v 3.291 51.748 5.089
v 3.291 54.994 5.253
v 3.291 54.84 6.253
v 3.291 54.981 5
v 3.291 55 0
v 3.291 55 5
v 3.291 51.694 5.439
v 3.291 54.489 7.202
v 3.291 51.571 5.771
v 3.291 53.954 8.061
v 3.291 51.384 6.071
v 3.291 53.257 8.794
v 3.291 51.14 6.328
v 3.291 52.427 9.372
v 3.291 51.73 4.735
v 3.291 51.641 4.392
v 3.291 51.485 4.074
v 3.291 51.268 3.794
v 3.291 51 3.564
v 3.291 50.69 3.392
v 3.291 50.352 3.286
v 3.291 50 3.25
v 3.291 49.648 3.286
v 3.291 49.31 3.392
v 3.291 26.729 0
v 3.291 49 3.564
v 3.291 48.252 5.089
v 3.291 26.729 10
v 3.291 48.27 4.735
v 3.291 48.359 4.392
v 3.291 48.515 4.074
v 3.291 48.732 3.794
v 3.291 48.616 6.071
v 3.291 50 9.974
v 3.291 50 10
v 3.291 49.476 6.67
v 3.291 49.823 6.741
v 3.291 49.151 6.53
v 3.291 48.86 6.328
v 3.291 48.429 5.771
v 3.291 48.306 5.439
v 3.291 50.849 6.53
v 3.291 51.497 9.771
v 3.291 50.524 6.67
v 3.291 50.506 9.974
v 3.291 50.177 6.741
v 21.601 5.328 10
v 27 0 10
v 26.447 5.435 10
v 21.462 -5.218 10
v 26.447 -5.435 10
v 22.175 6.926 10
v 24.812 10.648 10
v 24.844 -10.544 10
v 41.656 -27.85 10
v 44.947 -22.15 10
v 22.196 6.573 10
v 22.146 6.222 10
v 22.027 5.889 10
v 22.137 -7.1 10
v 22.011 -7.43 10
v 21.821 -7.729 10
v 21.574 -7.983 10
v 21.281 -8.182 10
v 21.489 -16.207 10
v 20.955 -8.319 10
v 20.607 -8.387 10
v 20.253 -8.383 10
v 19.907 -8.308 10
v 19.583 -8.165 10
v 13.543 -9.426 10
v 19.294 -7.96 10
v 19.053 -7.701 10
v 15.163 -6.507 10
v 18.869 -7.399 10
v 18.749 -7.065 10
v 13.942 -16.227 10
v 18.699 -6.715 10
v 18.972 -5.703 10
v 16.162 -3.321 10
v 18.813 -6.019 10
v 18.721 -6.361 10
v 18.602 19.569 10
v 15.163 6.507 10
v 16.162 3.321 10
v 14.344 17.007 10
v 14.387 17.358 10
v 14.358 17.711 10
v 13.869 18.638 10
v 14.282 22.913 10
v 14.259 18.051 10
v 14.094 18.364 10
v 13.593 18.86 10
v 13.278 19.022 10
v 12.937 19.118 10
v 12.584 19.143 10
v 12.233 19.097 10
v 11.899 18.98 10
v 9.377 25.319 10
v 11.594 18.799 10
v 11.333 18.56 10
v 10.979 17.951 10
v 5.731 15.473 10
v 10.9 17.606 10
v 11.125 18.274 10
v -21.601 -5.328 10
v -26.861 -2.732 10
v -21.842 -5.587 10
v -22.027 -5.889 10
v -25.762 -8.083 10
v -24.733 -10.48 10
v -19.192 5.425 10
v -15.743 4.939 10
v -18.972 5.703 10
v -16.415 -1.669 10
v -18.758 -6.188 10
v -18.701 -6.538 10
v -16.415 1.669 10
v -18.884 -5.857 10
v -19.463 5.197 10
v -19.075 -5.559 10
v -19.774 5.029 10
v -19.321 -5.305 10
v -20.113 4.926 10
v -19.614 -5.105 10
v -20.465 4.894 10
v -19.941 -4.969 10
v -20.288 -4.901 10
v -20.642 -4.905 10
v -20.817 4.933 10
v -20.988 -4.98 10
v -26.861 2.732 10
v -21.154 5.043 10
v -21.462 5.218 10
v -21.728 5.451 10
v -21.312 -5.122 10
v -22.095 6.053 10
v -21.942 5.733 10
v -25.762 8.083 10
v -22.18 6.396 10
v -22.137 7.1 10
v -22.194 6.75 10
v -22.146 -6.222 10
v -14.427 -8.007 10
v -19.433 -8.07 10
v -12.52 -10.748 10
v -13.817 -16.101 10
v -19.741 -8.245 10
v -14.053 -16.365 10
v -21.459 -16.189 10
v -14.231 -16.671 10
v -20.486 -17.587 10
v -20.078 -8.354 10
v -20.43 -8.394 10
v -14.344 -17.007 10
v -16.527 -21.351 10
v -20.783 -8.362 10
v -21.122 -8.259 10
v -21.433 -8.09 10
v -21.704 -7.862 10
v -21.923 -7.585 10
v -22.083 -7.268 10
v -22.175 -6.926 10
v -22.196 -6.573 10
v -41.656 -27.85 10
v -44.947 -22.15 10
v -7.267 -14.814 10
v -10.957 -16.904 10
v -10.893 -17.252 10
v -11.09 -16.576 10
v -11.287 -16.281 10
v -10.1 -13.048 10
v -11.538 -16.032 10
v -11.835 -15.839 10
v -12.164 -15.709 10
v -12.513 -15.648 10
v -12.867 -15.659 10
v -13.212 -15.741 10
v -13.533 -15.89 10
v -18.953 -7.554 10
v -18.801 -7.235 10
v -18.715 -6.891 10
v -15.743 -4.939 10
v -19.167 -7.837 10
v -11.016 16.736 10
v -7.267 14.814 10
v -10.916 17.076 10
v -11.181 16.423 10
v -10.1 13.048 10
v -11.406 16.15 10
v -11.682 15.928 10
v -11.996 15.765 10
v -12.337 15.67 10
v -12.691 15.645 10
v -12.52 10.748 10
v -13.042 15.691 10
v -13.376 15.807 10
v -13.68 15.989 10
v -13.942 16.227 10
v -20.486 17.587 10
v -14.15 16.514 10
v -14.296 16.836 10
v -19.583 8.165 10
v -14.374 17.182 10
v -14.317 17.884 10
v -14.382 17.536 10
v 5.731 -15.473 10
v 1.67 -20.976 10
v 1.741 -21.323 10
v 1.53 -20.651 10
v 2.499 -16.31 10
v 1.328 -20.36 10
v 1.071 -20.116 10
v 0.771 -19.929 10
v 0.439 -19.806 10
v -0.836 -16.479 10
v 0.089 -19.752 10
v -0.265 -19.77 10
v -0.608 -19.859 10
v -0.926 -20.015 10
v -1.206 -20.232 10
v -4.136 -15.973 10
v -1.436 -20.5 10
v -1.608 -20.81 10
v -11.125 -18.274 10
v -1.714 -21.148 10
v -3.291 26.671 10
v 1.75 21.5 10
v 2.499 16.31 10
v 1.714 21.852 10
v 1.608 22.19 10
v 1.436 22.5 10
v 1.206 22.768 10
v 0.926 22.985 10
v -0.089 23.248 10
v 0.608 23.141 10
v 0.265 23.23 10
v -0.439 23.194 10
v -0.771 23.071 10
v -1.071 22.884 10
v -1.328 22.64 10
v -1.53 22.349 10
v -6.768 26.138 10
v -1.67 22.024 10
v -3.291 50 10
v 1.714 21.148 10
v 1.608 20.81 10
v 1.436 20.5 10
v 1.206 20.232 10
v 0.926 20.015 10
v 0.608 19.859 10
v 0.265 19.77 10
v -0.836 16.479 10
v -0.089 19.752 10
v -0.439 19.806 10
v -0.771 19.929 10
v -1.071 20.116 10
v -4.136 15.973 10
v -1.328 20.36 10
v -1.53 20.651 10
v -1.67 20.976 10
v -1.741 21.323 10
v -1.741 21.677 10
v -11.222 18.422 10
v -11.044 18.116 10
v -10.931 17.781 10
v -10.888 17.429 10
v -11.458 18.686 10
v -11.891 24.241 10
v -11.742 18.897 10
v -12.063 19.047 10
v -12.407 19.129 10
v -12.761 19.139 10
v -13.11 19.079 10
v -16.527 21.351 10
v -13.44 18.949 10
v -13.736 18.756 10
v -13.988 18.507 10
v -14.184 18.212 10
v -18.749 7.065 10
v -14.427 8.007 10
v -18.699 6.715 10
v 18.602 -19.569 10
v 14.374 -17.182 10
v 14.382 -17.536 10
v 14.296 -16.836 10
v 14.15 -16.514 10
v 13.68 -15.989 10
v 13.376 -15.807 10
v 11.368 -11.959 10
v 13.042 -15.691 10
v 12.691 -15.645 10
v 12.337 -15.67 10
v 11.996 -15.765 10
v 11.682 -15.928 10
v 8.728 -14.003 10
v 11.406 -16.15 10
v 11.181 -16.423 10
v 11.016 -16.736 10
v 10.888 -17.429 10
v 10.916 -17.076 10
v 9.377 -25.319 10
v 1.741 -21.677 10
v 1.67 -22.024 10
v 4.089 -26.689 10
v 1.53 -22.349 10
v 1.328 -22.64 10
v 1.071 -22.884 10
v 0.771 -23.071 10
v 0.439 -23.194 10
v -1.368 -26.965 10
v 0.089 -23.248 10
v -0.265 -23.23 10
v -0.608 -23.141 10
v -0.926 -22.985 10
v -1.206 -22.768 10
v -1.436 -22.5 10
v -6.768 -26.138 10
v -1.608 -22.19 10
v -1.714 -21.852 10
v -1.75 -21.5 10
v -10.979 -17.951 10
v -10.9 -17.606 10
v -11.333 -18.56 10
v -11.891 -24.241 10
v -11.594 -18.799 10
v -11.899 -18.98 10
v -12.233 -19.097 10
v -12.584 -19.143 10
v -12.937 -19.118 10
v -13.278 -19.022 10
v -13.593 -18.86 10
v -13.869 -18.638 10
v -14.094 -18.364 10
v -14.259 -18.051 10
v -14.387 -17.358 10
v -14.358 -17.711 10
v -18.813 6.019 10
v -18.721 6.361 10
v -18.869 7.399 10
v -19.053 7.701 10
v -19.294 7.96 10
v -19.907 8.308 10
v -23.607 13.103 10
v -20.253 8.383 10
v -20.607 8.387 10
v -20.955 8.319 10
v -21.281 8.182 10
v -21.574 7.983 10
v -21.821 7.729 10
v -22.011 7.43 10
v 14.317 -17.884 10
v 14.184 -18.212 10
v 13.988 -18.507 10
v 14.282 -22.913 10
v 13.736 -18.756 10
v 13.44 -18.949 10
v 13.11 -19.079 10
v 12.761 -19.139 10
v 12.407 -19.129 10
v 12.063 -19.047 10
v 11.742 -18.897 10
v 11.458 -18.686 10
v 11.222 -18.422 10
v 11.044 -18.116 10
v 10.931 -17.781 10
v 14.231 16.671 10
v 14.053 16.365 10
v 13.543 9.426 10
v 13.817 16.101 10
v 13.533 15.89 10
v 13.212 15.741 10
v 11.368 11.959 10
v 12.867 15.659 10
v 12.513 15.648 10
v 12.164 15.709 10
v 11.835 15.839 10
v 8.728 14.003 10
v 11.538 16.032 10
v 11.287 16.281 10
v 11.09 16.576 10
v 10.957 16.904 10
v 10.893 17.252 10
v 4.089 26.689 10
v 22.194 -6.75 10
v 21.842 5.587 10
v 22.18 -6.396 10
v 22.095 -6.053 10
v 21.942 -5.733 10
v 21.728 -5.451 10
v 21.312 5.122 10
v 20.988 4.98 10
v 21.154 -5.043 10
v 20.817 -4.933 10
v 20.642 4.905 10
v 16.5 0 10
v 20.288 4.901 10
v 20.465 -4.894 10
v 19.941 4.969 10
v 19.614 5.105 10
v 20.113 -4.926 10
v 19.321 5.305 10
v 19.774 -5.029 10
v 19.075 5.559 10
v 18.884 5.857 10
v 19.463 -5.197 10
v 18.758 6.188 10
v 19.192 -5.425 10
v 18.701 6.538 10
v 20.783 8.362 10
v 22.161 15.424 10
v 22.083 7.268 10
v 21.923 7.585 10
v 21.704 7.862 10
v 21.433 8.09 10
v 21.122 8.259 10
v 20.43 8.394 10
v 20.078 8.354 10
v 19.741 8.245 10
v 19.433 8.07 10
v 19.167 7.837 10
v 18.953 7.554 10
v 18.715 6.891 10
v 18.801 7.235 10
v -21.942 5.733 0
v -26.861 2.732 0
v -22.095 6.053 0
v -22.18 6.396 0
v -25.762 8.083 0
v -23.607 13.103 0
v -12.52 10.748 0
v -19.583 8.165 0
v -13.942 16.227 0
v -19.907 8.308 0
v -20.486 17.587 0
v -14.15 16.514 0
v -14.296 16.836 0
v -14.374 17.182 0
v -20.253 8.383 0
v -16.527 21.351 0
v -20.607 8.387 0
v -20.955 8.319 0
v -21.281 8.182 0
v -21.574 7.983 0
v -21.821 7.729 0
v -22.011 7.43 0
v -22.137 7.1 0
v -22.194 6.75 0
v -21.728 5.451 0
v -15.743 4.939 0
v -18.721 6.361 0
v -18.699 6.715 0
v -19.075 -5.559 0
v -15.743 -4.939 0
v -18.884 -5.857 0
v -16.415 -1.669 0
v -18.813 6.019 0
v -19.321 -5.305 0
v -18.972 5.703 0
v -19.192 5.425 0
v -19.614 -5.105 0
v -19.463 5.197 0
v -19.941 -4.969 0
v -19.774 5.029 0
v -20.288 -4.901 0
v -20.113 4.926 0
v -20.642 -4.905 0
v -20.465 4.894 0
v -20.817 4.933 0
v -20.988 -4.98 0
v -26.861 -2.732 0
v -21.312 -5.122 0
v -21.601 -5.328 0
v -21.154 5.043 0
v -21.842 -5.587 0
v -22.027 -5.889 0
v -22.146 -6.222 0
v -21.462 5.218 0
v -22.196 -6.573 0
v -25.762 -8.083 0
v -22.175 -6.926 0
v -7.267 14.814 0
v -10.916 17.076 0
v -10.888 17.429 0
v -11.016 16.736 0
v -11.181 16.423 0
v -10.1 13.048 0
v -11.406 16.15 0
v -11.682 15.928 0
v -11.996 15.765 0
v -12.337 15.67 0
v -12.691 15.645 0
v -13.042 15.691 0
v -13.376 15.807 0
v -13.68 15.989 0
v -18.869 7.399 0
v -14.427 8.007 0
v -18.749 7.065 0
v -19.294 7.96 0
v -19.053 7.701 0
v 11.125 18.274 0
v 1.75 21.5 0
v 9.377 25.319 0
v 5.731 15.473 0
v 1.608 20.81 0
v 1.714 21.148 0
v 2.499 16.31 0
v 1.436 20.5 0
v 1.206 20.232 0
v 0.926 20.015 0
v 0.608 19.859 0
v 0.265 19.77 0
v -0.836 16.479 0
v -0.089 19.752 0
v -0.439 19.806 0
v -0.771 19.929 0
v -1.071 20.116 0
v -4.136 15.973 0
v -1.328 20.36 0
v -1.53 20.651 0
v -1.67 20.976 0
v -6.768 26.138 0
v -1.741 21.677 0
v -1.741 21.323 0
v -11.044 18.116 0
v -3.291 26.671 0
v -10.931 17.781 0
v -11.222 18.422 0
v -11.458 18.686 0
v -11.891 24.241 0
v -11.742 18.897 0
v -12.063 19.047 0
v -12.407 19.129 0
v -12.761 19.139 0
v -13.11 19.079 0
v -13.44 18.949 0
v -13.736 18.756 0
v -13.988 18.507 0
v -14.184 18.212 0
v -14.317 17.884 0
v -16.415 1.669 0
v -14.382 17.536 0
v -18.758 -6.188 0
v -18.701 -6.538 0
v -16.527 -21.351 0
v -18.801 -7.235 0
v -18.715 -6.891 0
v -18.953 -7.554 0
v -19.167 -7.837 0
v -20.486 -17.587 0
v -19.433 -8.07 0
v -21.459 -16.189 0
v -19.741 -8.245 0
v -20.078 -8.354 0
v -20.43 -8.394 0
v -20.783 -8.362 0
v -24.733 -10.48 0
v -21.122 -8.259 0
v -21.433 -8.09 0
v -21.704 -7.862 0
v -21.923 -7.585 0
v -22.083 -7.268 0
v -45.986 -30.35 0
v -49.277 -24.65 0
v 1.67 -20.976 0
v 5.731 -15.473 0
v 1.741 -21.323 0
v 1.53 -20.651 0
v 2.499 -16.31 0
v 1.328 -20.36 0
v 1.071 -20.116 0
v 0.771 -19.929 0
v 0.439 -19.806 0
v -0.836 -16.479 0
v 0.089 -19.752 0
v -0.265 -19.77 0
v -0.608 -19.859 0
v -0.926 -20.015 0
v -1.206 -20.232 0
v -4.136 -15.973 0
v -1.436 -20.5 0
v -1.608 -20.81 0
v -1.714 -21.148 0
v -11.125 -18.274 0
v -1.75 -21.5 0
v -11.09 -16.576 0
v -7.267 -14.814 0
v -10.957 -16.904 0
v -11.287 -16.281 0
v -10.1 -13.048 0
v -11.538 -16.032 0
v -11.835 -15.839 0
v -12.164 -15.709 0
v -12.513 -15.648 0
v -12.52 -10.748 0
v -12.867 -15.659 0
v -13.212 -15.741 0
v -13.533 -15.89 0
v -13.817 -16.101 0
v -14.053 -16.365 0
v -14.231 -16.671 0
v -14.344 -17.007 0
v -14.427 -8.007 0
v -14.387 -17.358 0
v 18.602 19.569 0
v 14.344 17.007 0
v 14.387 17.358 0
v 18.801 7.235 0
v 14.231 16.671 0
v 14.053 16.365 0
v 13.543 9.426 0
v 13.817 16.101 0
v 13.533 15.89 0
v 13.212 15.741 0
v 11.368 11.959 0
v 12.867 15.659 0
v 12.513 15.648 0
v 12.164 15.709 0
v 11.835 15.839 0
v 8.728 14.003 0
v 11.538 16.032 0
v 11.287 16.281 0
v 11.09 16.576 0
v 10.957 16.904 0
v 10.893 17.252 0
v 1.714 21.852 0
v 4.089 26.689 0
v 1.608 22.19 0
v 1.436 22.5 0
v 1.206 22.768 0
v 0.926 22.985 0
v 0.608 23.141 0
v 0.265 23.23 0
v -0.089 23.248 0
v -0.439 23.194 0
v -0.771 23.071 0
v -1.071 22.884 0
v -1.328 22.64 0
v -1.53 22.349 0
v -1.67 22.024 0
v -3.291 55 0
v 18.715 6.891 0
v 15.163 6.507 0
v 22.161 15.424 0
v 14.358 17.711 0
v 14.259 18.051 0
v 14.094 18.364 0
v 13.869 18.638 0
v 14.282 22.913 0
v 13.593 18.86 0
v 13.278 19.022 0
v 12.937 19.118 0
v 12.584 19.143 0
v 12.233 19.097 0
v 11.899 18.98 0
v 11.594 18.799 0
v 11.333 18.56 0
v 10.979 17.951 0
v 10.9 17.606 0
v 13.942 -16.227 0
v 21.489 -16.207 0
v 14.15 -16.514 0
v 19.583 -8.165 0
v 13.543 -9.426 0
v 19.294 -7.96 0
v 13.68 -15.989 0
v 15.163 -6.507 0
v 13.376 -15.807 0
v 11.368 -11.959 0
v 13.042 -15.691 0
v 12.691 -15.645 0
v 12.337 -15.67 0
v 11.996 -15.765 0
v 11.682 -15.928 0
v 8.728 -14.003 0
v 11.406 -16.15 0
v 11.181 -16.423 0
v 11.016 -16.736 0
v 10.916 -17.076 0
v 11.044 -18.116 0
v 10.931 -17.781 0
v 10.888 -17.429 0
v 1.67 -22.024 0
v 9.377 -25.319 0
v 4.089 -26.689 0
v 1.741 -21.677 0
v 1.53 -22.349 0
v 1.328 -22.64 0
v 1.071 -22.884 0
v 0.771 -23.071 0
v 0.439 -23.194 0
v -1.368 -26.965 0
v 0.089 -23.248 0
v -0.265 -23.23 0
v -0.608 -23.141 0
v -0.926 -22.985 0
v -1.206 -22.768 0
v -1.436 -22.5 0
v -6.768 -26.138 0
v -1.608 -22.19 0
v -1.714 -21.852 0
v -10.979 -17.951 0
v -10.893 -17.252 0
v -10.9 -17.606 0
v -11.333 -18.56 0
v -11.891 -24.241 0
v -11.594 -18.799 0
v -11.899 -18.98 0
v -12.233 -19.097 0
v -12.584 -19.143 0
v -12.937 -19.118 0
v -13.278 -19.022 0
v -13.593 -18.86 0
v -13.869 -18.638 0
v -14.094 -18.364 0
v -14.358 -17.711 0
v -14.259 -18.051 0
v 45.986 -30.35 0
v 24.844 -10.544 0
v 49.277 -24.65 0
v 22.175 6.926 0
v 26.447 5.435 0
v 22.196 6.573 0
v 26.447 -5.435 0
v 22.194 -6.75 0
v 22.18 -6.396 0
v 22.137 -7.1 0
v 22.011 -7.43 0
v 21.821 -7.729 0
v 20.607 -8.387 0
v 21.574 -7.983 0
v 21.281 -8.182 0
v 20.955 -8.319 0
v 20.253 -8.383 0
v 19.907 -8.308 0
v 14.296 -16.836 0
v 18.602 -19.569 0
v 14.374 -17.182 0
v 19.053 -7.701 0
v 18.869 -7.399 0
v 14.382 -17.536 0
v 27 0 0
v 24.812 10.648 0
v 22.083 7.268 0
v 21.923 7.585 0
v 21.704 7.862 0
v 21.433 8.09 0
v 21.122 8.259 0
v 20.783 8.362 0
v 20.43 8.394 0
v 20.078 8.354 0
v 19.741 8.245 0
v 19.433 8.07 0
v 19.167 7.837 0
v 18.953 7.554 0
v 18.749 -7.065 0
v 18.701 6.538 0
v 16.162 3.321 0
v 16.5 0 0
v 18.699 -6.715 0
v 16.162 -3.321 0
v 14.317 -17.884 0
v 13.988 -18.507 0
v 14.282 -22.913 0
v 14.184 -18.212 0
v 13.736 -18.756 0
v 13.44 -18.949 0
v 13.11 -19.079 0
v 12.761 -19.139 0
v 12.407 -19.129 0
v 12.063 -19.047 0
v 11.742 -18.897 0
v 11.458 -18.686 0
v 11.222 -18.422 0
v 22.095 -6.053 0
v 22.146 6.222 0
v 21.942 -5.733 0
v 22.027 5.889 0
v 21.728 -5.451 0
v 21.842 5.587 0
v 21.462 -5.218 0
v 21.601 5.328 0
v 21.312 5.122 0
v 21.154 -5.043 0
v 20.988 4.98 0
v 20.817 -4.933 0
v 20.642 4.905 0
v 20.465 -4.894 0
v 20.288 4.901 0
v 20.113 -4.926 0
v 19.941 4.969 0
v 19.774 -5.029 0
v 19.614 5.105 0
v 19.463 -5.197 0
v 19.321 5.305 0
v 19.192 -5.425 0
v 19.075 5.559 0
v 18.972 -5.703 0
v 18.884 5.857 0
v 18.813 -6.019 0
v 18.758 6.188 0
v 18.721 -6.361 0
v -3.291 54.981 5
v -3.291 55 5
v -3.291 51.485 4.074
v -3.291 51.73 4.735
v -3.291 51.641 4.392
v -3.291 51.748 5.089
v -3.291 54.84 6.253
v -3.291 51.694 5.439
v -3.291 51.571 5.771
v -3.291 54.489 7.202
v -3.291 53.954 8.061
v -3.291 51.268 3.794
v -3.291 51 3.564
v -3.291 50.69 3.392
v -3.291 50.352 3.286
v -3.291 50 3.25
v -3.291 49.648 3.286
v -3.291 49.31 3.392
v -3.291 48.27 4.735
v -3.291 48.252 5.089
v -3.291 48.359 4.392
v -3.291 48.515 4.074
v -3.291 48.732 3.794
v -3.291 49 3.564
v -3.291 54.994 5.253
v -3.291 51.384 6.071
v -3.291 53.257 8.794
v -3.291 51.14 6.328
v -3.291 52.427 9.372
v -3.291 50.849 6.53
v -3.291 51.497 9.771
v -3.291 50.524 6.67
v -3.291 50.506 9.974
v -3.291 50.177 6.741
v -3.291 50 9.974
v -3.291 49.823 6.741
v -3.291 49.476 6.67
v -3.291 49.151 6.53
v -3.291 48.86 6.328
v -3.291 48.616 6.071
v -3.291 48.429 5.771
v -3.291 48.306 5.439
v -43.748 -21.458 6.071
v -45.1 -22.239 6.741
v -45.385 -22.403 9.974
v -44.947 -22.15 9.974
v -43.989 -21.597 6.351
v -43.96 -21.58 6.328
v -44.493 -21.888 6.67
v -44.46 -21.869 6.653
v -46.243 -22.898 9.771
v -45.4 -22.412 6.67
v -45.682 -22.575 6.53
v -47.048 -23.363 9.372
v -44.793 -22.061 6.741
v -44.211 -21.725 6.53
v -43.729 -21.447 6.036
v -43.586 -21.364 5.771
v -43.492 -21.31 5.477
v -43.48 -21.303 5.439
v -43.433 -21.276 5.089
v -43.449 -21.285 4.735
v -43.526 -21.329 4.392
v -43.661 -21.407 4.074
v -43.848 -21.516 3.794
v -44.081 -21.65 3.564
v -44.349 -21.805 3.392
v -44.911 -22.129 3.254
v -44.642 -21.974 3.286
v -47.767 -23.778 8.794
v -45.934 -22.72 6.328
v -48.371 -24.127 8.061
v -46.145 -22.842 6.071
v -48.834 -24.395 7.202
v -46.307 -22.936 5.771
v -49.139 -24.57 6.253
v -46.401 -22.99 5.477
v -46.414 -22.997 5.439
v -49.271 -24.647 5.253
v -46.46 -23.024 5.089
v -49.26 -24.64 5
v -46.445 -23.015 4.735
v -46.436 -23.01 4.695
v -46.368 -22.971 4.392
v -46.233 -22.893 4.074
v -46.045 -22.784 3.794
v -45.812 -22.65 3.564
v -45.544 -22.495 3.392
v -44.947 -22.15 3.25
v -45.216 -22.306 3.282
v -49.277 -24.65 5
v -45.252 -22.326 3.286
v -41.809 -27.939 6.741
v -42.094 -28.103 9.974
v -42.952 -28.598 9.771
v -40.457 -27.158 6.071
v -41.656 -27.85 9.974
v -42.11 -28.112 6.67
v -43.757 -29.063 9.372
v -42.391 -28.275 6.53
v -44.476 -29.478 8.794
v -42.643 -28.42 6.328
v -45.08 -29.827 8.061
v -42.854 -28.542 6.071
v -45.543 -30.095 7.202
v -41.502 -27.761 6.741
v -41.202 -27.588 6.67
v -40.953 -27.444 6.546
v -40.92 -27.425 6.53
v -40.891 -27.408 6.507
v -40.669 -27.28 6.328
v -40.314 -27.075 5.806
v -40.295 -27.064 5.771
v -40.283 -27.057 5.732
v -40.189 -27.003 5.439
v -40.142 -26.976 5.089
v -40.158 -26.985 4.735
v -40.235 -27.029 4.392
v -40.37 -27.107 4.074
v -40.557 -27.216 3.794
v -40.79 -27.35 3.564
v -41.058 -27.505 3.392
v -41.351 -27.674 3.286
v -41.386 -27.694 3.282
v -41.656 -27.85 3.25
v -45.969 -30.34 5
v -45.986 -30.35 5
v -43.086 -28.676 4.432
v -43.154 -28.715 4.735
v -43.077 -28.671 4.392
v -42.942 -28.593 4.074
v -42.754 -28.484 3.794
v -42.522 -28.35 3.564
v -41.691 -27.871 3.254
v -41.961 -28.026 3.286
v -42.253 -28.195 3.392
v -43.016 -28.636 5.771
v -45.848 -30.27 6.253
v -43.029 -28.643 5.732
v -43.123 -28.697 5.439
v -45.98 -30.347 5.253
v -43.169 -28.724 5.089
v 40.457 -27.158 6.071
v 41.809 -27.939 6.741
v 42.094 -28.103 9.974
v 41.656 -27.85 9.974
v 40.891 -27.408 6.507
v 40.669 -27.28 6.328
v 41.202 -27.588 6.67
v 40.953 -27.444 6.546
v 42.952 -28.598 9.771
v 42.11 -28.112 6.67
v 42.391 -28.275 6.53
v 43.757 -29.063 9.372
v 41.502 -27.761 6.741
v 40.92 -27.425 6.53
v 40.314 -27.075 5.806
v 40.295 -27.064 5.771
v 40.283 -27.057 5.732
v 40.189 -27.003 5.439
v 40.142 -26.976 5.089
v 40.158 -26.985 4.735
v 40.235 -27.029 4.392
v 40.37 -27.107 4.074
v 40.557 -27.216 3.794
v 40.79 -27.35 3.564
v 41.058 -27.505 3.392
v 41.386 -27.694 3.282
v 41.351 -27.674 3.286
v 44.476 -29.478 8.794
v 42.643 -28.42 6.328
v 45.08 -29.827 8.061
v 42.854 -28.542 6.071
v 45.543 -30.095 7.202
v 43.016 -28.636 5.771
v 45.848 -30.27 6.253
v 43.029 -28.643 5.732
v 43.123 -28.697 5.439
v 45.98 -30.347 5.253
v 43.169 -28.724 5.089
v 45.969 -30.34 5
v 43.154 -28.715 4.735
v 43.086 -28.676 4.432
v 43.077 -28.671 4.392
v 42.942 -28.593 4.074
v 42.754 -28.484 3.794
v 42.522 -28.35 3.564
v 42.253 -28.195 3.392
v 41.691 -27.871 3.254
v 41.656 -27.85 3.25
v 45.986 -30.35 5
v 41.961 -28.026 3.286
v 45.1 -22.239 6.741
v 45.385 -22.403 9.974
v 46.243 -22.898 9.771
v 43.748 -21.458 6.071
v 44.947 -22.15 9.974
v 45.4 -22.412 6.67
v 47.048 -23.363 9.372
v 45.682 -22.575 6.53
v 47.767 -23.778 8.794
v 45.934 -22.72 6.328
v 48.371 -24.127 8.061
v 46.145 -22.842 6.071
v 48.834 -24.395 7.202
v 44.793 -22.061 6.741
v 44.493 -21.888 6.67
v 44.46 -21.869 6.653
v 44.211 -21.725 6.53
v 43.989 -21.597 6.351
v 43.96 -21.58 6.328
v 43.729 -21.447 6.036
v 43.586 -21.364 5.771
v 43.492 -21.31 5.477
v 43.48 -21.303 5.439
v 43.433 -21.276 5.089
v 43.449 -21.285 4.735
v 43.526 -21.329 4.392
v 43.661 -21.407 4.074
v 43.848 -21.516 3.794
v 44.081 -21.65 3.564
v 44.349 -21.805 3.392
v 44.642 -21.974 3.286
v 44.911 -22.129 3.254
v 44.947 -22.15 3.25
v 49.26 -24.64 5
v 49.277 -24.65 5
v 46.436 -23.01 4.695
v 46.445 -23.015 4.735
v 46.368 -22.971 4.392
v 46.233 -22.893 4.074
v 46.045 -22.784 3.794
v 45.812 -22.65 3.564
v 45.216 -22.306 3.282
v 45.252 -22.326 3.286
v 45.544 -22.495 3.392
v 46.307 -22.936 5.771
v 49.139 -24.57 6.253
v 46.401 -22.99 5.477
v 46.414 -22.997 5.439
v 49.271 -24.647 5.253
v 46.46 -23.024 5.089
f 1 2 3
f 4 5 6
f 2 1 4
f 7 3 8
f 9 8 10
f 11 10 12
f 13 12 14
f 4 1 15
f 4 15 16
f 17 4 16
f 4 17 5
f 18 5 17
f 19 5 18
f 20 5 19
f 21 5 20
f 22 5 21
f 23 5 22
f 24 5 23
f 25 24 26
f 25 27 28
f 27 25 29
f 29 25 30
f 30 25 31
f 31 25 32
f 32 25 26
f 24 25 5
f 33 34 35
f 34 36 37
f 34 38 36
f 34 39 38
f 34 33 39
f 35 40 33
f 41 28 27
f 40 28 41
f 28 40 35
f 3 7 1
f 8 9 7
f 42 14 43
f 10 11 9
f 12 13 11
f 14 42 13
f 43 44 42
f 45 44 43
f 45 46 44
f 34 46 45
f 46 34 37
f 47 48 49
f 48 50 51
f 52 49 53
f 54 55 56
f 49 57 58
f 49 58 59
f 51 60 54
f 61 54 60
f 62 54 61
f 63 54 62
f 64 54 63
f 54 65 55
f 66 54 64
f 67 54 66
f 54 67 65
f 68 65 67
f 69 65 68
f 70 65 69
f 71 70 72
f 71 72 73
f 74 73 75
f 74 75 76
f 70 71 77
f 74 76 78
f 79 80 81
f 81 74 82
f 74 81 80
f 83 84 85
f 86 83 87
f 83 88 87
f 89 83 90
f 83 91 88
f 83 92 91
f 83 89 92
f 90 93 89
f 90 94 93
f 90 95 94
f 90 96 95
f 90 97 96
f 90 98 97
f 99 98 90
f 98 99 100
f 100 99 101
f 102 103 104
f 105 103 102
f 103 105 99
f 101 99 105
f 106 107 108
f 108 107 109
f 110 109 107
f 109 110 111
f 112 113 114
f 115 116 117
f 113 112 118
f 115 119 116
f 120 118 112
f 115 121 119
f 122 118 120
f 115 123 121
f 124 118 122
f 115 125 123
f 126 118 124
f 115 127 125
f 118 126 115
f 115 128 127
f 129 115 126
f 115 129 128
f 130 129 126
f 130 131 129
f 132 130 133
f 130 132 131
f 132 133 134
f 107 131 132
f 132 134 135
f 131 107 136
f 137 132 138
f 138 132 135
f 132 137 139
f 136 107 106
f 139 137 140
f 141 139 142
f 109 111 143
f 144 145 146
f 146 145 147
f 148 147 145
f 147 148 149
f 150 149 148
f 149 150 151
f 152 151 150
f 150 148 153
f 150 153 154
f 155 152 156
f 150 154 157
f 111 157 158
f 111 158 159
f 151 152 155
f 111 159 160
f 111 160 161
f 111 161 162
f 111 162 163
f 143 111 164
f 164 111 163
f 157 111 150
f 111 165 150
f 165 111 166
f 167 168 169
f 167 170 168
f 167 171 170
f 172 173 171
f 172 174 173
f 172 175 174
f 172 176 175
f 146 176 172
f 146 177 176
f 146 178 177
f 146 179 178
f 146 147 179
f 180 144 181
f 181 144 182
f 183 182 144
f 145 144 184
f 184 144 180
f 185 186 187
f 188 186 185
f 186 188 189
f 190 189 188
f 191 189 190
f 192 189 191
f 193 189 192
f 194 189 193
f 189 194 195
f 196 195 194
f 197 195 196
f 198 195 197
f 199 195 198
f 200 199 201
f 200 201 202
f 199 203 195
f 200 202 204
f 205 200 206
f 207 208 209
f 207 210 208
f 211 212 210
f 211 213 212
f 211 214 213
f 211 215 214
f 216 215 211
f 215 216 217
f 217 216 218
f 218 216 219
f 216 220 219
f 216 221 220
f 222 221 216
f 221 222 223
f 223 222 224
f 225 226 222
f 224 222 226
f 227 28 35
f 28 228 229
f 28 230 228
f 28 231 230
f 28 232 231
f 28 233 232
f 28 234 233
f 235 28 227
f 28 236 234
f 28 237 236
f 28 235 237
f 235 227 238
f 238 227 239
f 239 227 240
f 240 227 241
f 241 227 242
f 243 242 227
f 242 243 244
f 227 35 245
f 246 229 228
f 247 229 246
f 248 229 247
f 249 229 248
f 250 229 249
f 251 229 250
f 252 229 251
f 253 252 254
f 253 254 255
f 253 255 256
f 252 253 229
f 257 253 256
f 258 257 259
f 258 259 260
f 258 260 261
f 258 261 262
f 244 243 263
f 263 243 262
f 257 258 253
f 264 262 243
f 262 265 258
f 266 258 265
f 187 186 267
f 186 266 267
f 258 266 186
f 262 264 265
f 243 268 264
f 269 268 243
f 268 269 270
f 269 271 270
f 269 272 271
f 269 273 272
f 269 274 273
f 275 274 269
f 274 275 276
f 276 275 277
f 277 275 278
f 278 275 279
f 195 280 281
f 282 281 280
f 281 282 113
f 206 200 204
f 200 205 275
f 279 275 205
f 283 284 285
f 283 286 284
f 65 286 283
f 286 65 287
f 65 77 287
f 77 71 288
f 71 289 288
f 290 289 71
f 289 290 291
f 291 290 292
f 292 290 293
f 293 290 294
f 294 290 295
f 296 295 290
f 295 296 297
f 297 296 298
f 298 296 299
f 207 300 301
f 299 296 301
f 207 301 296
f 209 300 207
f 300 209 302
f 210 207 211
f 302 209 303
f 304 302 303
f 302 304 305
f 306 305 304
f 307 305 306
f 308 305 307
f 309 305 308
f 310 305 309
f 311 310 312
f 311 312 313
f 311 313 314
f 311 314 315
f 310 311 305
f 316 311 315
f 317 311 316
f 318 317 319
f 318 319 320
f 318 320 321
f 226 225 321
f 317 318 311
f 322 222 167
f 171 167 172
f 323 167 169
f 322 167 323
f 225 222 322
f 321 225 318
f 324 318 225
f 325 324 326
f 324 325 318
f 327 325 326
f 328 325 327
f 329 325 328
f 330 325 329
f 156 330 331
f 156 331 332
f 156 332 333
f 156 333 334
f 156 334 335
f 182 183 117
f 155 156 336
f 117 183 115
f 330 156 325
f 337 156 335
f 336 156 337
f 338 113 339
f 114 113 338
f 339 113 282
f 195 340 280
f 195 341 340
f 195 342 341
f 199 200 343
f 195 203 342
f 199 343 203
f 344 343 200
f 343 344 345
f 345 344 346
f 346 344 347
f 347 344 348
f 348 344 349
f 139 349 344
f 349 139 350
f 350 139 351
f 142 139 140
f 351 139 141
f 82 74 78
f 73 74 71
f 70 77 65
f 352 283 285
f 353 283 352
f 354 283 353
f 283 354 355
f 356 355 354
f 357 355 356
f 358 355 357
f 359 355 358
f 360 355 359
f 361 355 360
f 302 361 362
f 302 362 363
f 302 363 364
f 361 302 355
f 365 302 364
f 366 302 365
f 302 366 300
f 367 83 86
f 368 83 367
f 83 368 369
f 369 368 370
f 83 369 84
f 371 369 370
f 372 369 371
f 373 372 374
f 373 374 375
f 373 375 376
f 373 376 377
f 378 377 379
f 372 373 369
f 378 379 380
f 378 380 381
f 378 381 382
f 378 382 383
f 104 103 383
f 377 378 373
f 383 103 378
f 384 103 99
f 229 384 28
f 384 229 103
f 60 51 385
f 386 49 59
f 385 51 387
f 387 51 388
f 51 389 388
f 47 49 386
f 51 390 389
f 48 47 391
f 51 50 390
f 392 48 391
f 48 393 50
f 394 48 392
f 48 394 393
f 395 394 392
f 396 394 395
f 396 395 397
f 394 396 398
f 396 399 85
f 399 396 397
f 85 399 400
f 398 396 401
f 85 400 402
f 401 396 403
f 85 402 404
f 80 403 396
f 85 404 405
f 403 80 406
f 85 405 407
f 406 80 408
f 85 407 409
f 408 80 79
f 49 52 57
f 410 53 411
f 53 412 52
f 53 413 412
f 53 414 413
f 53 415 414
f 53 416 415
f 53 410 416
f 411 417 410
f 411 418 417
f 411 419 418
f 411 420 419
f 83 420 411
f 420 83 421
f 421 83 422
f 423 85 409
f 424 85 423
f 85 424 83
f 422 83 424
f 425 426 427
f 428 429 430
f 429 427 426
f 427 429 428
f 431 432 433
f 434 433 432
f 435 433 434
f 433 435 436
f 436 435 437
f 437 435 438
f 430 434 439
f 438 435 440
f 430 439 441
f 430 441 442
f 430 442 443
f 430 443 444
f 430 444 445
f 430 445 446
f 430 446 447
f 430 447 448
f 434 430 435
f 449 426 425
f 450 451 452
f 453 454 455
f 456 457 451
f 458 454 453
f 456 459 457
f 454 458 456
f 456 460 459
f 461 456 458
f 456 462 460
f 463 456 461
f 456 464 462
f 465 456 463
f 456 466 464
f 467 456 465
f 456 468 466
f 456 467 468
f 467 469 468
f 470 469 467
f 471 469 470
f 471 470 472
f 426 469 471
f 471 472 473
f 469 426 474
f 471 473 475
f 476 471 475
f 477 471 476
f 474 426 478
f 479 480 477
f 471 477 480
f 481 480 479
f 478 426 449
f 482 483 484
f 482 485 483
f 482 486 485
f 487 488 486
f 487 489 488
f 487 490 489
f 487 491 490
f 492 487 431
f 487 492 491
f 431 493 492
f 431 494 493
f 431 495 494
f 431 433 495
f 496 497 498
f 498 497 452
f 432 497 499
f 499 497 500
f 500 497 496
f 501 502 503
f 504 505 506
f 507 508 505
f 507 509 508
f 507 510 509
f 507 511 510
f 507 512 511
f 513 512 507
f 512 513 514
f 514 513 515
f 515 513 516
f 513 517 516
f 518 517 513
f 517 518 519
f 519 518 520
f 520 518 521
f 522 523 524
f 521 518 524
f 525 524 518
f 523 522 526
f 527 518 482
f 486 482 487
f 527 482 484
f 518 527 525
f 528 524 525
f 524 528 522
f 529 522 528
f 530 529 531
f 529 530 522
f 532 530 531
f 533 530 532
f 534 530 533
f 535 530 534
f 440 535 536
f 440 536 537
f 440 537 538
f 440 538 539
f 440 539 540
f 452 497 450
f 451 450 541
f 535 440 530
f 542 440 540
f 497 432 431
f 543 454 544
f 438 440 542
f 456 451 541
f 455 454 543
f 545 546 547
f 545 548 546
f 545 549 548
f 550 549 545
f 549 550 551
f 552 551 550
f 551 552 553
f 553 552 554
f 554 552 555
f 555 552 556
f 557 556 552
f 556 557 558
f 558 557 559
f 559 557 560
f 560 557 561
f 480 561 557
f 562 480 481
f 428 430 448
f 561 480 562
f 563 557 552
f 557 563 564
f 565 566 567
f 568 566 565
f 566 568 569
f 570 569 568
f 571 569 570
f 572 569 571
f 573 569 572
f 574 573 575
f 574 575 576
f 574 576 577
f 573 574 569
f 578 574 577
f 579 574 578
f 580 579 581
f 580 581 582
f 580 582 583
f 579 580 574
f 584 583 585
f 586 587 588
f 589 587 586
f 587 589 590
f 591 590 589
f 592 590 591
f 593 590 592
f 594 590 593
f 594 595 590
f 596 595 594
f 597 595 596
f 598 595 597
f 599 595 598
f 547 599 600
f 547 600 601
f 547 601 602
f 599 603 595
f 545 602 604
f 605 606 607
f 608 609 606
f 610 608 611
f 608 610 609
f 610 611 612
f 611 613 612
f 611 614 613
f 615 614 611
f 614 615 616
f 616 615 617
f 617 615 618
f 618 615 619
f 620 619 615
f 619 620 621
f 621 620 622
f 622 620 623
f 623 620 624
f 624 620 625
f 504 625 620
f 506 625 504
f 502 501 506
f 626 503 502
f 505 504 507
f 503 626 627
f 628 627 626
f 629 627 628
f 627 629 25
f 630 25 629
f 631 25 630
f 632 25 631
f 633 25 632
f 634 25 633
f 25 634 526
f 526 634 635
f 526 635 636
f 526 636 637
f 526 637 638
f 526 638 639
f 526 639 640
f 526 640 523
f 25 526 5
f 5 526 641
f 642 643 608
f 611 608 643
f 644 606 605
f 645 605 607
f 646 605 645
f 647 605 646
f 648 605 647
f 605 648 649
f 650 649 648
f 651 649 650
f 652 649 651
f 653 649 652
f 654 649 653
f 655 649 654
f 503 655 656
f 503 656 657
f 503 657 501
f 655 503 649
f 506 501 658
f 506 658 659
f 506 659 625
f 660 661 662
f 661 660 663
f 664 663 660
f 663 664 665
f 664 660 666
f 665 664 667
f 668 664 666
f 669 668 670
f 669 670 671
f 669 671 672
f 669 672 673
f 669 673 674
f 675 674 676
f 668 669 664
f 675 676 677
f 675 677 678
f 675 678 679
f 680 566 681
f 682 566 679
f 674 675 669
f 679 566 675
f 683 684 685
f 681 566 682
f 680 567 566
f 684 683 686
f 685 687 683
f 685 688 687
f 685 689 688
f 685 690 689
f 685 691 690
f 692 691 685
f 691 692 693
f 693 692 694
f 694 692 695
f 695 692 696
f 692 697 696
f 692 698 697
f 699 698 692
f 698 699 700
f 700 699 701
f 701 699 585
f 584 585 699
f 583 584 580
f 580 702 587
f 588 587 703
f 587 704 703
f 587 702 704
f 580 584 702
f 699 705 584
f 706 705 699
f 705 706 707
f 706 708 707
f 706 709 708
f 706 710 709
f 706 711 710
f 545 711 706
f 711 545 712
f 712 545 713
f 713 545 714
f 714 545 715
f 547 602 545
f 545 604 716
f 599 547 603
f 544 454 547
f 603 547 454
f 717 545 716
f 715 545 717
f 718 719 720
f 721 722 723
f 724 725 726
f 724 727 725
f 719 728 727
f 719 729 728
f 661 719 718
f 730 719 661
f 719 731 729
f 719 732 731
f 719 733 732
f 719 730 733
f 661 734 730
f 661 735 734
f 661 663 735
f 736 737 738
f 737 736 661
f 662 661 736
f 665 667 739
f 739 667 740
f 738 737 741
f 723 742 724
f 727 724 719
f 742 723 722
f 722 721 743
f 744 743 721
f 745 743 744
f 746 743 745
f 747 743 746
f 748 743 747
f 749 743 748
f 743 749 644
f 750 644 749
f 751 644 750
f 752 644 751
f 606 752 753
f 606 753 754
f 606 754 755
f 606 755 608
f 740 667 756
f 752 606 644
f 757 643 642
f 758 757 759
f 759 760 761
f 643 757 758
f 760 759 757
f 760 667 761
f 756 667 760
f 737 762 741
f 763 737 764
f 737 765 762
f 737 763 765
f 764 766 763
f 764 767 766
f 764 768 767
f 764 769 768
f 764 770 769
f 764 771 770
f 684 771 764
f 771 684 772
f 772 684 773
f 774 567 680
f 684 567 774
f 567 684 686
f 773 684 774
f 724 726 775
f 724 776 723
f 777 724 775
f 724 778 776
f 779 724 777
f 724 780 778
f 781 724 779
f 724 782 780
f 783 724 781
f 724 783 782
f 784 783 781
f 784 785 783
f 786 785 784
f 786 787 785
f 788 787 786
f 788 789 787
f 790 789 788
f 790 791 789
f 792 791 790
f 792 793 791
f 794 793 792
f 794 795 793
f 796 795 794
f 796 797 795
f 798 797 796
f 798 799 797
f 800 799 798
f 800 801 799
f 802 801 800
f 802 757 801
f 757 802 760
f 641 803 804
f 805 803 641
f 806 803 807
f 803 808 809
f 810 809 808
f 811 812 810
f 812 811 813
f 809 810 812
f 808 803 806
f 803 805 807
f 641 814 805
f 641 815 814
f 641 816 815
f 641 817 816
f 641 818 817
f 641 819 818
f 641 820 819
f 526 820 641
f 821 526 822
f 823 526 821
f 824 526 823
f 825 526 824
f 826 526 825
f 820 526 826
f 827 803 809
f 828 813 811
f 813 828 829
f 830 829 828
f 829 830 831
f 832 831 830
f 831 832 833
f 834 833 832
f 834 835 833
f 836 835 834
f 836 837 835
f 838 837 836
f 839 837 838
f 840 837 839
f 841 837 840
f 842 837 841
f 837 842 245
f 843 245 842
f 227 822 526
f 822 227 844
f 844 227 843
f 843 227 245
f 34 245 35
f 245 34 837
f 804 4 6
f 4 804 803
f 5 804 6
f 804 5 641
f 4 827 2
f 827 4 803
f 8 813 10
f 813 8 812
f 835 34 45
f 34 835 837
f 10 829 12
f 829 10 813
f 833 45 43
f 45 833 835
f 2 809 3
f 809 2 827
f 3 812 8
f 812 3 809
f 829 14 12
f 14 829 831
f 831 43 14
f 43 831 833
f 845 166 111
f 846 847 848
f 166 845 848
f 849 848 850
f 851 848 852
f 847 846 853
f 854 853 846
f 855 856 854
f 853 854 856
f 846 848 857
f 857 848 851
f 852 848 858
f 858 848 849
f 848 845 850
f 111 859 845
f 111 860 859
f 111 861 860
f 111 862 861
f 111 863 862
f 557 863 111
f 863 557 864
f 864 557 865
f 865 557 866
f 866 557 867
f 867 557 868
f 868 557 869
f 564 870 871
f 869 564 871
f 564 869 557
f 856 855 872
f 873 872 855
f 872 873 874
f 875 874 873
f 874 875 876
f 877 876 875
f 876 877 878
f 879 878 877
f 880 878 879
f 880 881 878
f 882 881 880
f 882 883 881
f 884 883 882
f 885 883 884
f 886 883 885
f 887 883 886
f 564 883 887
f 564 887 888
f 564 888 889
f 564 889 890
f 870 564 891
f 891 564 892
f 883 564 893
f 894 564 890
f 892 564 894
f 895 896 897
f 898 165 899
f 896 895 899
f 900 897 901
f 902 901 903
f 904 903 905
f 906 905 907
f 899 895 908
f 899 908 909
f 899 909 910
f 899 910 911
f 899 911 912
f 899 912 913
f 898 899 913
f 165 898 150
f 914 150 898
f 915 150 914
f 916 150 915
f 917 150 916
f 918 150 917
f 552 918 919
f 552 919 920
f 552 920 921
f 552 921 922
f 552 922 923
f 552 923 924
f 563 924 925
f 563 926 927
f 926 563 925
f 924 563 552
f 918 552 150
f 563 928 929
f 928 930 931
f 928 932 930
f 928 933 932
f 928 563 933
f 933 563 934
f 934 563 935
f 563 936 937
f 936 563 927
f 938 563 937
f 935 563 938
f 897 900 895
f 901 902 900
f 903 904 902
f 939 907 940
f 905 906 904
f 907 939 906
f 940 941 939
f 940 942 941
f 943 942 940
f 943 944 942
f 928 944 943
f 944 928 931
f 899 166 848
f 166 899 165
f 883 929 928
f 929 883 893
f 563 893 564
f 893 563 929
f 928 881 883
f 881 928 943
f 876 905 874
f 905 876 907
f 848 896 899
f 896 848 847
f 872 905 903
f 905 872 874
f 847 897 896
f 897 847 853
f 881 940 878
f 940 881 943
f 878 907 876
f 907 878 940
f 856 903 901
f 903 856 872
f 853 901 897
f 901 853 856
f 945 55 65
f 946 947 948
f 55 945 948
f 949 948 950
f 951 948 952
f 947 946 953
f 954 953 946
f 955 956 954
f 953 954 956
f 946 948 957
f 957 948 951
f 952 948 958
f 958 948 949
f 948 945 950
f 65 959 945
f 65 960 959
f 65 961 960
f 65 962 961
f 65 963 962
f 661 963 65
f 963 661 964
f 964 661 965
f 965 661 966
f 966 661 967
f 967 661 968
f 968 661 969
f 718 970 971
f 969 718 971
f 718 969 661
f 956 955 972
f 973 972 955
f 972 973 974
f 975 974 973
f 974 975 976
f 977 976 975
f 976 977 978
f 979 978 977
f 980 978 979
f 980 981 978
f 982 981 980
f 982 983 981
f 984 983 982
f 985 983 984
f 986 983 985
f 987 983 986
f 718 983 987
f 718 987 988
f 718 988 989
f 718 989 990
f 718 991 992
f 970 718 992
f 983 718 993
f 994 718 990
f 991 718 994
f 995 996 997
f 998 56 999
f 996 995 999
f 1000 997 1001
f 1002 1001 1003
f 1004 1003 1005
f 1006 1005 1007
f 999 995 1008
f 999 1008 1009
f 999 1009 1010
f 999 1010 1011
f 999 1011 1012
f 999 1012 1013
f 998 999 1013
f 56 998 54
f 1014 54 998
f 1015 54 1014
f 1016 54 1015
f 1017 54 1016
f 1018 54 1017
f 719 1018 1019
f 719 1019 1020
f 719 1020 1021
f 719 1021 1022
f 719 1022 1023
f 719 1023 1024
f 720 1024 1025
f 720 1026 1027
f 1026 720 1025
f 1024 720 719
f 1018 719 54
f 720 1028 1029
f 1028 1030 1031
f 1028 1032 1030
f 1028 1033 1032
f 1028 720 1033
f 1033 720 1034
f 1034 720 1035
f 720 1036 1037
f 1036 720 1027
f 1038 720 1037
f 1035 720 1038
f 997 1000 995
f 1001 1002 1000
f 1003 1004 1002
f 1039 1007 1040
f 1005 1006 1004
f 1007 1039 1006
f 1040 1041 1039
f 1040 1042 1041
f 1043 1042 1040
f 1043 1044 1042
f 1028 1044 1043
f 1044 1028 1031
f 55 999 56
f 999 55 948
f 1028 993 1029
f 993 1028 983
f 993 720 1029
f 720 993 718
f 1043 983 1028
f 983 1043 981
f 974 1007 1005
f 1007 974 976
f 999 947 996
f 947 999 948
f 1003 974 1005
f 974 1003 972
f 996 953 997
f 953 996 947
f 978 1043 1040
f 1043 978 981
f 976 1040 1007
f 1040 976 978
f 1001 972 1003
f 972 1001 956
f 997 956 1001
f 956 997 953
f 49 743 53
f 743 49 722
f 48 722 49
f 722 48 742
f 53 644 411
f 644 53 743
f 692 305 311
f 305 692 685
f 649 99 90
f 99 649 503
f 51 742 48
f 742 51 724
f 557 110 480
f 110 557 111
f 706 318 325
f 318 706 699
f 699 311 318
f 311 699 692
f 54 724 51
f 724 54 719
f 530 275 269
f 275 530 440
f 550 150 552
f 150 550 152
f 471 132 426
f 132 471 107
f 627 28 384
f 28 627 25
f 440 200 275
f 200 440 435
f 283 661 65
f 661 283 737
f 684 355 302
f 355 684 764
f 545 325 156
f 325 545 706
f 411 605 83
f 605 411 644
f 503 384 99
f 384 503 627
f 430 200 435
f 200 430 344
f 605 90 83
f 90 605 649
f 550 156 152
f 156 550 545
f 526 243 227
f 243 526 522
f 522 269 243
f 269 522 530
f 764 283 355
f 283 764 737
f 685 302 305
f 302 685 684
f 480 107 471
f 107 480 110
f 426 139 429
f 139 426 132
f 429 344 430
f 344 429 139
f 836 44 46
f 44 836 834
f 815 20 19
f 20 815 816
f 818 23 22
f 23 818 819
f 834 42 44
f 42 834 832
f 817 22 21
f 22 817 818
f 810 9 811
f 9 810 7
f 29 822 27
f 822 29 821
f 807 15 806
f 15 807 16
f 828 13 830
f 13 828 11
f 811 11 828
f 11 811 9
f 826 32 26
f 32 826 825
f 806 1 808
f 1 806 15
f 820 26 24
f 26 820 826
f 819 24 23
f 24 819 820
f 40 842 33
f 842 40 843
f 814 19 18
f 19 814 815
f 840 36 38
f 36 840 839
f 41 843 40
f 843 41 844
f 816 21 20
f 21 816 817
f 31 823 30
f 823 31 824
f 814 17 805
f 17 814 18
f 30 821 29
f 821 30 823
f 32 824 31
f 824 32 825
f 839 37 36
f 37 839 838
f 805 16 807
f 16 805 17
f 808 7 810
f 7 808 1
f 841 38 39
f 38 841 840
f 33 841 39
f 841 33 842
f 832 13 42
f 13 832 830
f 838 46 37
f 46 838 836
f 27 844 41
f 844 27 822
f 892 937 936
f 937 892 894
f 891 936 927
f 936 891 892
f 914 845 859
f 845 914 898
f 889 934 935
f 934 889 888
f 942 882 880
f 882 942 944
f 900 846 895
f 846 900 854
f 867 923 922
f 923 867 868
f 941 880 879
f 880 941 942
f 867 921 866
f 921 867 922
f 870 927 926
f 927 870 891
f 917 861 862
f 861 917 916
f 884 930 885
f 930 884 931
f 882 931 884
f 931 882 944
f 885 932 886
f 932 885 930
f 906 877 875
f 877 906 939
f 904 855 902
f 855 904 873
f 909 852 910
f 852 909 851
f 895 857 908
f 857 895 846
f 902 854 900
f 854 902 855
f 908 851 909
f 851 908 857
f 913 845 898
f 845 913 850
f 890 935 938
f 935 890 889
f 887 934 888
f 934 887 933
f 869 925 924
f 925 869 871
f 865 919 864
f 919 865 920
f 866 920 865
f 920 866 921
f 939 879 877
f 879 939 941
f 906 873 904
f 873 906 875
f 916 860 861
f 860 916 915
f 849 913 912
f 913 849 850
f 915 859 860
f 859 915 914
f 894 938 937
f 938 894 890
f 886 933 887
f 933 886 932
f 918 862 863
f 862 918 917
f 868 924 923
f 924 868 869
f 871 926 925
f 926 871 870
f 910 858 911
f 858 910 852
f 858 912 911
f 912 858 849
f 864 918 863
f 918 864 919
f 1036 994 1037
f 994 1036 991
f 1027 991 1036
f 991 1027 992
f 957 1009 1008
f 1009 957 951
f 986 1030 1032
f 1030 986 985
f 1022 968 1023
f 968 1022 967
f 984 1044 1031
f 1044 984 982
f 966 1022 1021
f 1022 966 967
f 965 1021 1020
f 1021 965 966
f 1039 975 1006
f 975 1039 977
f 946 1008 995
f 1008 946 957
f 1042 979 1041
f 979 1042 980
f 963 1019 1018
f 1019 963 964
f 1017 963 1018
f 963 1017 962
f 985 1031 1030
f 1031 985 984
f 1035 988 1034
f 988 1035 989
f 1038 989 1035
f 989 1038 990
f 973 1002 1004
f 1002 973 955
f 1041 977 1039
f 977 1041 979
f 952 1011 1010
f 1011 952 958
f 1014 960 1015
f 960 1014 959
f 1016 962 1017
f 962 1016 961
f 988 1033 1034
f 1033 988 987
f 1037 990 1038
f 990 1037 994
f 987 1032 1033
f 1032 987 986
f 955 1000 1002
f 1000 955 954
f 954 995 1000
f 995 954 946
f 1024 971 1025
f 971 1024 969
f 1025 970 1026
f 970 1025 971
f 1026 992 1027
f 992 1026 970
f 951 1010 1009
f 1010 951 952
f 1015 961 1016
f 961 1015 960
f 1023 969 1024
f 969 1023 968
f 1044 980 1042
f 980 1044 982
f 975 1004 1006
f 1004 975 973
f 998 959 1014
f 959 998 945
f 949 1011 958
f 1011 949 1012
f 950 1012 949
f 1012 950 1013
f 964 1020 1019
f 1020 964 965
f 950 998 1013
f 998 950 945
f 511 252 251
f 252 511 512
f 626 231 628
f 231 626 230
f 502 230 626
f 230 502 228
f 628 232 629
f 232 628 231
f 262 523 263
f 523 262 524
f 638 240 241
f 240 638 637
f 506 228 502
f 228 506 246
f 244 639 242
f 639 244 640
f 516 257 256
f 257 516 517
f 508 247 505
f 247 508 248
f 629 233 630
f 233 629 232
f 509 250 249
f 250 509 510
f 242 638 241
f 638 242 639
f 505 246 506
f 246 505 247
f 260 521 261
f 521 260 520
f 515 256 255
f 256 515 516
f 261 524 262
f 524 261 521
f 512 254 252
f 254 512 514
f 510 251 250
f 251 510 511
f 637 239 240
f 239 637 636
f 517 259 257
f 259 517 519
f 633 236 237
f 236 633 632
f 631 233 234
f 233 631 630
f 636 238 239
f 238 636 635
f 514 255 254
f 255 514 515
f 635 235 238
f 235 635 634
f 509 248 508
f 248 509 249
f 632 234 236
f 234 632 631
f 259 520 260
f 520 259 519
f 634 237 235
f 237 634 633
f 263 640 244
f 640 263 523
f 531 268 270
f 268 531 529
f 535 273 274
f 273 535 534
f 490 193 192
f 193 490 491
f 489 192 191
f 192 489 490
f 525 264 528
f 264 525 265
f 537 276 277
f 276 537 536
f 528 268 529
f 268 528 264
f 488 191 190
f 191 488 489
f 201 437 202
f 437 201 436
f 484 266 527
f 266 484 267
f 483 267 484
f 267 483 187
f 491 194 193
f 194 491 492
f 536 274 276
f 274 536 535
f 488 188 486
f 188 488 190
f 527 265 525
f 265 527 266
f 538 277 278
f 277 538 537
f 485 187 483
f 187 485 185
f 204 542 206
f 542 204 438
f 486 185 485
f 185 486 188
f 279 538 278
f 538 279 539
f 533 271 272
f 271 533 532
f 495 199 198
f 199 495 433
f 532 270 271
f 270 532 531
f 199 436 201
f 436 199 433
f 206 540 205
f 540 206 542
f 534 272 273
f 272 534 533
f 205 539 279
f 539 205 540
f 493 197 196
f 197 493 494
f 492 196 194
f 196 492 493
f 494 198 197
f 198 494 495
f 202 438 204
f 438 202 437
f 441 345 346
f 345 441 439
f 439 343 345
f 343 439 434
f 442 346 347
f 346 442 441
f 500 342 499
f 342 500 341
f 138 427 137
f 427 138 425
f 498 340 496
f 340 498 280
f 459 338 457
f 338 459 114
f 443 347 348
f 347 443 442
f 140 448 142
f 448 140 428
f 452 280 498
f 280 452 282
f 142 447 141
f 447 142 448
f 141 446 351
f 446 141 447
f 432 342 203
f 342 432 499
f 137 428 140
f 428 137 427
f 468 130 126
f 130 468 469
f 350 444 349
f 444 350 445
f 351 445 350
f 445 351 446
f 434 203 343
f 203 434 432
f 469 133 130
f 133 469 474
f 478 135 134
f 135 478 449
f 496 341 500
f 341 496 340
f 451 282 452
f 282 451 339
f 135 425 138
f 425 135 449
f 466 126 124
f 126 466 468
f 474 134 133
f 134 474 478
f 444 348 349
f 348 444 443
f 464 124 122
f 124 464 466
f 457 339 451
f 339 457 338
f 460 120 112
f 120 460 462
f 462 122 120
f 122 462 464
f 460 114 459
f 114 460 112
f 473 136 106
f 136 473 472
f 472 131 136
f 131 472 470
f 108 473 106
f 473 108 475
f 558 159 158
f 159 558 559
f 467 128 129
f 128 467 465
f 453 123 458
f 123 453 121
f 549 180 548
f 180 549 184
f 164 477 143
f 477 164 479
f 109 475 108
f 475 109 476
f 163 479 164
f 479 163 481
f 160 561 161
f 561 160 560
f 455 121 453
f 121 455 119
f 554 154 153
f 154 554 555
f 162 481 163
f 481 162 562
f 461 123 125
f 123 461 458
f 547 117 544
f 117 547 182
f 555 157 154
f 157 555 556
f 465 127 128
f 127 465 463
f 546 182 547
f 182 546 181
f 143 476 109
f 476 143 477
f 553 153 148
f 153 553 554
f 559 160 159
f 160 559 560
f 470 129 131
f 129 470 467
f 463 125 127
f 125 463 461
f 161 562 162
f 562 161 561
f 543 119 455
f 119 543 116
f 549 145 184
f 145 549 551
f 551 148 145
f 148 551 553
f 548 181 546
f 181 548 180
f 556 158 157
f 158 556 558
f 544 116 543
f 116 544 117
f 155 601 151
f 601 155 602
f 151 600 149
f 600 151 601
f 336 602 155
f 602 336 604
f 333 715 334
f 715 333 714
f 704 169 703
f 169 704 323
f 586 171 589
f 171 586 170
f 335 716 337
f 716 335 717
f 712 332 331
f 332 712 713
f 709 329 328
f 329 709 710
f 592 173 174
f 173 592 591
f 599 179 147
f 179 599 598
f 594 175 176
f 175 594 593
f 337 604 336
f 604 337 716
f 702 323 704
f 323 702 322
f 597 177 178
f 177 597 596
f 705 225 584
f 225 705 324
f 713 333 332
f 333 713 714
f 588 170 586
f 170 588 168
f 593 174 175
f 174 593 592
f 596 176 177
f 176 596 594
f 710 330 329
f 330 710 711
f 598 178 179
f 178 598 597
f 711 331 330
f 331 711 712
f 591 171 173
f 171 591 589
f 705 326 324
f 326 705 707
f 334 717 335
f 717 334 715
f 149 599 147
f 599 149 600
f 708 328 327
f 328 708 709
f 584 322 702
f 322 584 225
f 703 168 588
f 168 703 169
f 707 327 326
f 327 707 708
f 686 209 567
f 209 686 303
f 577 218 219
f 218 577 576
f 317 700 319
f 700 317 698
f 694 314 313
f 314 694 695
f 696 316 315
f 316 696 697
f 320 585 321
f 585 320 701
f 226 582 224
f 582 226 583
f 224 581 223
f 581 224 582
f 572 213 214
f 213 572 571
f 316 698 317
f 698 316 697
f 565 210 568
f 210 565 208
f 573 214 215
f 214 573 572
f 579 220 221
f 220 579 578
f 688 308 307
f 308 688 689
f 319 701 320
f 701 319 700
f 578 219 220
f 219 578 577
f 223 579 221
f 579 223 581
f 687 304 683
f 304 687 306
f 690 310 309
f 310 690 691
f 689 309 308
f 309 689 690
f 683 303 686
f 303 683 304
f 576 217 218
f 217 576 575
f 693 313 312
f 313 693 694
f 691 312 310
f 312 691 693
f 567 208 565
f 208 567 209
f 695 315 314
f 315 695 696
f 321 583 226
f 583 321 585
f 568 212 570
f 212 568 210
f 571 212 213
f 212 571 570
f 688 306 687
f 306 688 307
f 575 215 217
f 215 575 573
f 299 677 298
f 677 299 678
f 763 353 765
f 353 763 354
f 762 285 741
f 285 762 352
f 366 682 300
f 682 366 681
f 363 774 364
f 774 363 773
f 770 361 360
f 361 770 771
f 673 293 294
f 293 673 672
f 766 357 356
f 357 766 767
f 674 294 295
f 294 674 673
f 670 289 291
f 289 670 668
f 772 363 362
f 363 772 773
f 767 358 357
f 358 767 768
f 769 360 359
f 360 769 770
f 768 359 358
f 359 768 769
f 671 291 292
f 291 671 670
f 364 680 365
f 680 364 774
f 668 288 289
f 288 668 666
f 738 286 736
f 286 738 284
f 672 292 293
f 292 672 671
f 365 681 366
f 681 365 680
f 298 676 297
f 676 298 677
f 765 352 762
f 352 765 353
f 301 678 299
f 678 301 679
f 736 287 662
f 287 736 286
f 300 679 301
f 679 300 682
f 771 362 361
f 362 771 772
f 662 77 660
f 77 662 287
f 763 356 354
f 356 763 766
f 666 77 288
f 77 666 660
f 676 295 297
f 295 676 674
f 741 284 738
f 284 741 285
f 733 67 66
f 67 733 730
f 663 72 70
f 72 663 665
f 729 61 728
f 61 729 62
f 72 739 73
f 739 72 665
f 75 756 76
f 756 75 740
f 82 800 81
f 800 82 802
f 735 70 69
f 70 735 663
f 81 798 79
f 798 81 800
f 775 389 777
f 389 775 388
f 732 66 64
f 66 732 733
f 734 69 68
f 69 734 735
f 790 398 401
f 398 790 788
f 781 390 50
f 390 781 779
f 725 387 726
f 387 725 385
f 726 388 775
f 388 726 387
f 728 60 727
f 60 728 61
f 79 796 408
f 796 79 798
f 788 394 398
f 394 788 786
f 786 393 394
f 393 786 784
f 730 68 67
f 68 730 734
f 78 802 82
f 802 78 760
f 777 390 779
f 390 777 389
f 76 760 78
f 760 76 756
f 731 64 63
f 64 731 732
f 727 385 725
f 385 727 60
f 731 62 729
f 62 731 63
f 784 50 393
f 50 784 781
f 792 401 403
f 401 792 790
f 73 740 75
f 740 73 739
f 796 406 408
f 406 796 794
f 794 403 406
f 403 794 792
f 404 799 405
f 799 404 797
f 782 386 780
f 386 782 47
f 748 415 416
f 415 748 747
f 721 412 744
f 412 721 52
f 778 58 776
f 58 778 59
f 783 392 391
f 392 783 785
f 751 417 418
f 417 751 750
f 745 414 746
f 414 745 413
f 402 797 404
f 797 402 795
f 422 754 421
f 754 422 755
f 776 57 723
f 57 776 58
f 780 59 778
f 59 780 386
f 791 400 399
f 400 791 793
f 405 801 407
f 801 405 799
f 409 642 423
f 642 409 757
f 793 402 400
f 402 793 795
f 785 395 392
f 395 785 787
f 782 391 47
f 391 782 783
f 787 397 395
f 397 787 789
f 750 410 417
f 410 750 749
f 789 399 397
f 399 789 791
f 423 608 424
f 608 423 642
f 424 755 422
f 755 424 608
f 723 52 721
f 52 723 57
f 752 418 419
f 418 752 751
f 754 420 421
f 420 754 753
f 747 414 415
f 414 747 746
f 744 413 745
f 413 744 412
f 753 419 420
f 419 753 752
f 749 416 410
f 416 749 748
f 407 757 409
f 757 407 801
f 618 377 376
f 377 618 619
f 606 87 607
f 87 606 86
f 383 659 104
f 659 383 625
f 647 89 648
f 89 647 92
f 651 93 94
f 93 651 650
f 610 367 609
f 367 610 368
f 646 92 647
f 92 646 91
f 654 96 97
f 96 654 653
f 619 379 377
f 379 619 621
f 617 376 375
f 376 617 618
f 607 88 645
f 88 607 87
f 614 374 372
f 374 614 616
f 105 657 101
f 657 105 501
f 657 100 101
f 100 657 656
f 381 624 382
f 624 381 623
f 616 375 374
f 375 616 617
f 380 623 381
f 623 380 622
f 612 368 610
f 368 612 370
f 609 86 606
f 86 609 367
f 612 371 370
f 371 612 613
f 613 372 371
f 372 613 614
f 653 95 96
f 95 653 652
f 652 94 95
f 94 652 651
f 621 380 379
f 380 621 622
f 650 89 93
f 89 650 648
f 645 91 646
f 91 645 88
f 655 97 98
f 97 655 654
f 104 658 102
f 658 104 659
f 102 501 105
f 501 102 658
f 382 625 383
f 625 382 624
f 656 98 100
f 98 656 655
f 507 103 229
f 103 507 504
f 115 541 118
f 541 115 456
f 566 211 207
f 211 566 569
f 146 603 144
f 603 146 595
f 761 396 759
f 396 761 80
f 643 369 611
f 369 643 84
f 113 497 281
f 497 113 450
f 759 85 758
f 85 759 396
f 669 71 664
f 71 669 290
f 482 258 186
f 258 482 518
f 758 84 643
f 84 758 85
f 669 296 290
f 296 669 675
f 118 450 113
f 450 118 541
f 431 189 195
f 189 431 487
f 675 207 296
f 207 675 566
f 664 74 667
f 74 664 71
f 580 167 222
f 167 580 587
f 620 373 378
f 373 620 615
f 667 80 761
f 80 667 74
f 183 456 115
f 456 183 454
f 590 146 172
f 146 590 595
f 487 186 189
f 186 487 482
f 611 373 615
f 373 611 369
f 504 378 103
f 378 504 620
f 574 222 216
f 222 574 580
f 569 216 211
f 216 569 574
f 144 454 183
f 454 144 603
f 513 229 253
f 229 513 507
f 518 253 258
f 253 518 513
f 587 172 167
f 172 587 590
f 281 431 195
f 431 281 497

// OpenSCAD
// file: config.scad
// https://docs.google.com/viewer?a=v&pid=explorer&chrome=true&srcid=0B8AGtzEPL1XpNGIwMjM0NzQtZmMyMS00YmU2LTkwMjItNTkzNzA0MDJkZTAx&hl=en_US&authkey=CMjZjW0

$fn = 31;

//Delta config constants
upperlinkage = 63; 
lowerlinkage = 126;
baseradius = 35;
endeffector = 50; //radius of the end effector
fourbarspacing = 70;

//hardware
screwdia = 3.5; //m3
screwheaddia = 5.6; //m3
screwheadheight = 3.2; //m3
nutapothem = 5.7; //m3
nutheight = 2.5; //m3 lock nut

//motors 
holespacing = 17*2.54*sin(45); //nema 17
shaftlength = 22;
shaftdia = 5;
bodylength = 48;
bodywidth = 42; //could also be diameter of a round servo
motorwall = 2.75;
motorcenterdia = 25;

//Structure pieces
structbase = 110;  //180
structheight = 40;  //70
structholes = 3; //how many holes are on each side. 
structthickness = 2;
structbracewidth = 9;

//z axis plates
smoothroddia = 8;
platelength = 110;
platethickness = 3;

//cups
cupwall = 2.7;

//end effector
extruderspacing = 40;
extrudermountholes = 10;

//base
basemotorwall = 2.7;

//upper linkage
upperlinkthick = nutapothem/cos(30);
upperlinkwidth = 20;

//coupling
leadscrewdia = 8;
couplingwall = 5;
couplingheight = 30;

//general shit
nutwall = nutapothem/4;
// main file
/*
  Deltafab - A Fully Parametric and Printable RepRap
    Copyright (C) 2011  Steve Kelly

    This program is free software: you can redistribute it and/or modify
    it under the terms of the GNU General Public License as published by
    the Free Software Foundation, either version 3 of the License, or
    (at your option) any later version.

    This program is distributed in the hope that it will be useful,
    but WITHOUT ANY WARRANTY; without even the implied warranty of
    MERCHANTABILITY or FITNESS FOR A PARTICULAR PURPOSE.  See the
    GNU General Public License for more details.

    You should have received a copy of the GNU General Public License
    along with this program.  If not, see <http://www.gnu.org/licenses/>.
*/

include <config.scad>;

module endeffector(){

	difference(){

		union(){
			//four bar interface
			for( i = [0 : 120 : 360]){
				rotate([0,0,i])translate([-upperlinkthick/2,0,0]){
					cube([upperlinkthick,endeffector,upperlinkwidth/2]);
					cube([upperlinkthick,endeffector+upperlinkwidth/4,upperlinkwidth/4]);
					translate([0,endeffector,upperlinkwidth/4])rotate([0,90,0])cylinder (r=upperlinkwidth/4, h = upperlinkthick);
				}
			}
			cylinder(r=extruderspacing/2+screwdia*2, h= upperlinkwidth/2); 	
		}
		
		translate([0,0,-1])cylinder(r=extruderspacing/2-screwdia, h= upperlinkwidth/2+2);
 
		for( i = [0 : 120 : 360]){
				rotate([0,0,i])translate([-upperlinkthick/2,0,0]){
					translate([-1,endeffector,upperlinkwidth/4])rotate([0,90,0])cylinder (r=screwdia/2, h = upperlinkthick+2);
				}
		}
		//extruder mount holes
		for( i = [0 : 360/extrudermountholes : 360]){
				rotate([0,0,i]){
					translate([0,endeffector/2-screwdia,-1])cylinder (r=screwdia/2, h = upperlinkwidth/2+2);
				}
		}
	}

}

endeffector();
